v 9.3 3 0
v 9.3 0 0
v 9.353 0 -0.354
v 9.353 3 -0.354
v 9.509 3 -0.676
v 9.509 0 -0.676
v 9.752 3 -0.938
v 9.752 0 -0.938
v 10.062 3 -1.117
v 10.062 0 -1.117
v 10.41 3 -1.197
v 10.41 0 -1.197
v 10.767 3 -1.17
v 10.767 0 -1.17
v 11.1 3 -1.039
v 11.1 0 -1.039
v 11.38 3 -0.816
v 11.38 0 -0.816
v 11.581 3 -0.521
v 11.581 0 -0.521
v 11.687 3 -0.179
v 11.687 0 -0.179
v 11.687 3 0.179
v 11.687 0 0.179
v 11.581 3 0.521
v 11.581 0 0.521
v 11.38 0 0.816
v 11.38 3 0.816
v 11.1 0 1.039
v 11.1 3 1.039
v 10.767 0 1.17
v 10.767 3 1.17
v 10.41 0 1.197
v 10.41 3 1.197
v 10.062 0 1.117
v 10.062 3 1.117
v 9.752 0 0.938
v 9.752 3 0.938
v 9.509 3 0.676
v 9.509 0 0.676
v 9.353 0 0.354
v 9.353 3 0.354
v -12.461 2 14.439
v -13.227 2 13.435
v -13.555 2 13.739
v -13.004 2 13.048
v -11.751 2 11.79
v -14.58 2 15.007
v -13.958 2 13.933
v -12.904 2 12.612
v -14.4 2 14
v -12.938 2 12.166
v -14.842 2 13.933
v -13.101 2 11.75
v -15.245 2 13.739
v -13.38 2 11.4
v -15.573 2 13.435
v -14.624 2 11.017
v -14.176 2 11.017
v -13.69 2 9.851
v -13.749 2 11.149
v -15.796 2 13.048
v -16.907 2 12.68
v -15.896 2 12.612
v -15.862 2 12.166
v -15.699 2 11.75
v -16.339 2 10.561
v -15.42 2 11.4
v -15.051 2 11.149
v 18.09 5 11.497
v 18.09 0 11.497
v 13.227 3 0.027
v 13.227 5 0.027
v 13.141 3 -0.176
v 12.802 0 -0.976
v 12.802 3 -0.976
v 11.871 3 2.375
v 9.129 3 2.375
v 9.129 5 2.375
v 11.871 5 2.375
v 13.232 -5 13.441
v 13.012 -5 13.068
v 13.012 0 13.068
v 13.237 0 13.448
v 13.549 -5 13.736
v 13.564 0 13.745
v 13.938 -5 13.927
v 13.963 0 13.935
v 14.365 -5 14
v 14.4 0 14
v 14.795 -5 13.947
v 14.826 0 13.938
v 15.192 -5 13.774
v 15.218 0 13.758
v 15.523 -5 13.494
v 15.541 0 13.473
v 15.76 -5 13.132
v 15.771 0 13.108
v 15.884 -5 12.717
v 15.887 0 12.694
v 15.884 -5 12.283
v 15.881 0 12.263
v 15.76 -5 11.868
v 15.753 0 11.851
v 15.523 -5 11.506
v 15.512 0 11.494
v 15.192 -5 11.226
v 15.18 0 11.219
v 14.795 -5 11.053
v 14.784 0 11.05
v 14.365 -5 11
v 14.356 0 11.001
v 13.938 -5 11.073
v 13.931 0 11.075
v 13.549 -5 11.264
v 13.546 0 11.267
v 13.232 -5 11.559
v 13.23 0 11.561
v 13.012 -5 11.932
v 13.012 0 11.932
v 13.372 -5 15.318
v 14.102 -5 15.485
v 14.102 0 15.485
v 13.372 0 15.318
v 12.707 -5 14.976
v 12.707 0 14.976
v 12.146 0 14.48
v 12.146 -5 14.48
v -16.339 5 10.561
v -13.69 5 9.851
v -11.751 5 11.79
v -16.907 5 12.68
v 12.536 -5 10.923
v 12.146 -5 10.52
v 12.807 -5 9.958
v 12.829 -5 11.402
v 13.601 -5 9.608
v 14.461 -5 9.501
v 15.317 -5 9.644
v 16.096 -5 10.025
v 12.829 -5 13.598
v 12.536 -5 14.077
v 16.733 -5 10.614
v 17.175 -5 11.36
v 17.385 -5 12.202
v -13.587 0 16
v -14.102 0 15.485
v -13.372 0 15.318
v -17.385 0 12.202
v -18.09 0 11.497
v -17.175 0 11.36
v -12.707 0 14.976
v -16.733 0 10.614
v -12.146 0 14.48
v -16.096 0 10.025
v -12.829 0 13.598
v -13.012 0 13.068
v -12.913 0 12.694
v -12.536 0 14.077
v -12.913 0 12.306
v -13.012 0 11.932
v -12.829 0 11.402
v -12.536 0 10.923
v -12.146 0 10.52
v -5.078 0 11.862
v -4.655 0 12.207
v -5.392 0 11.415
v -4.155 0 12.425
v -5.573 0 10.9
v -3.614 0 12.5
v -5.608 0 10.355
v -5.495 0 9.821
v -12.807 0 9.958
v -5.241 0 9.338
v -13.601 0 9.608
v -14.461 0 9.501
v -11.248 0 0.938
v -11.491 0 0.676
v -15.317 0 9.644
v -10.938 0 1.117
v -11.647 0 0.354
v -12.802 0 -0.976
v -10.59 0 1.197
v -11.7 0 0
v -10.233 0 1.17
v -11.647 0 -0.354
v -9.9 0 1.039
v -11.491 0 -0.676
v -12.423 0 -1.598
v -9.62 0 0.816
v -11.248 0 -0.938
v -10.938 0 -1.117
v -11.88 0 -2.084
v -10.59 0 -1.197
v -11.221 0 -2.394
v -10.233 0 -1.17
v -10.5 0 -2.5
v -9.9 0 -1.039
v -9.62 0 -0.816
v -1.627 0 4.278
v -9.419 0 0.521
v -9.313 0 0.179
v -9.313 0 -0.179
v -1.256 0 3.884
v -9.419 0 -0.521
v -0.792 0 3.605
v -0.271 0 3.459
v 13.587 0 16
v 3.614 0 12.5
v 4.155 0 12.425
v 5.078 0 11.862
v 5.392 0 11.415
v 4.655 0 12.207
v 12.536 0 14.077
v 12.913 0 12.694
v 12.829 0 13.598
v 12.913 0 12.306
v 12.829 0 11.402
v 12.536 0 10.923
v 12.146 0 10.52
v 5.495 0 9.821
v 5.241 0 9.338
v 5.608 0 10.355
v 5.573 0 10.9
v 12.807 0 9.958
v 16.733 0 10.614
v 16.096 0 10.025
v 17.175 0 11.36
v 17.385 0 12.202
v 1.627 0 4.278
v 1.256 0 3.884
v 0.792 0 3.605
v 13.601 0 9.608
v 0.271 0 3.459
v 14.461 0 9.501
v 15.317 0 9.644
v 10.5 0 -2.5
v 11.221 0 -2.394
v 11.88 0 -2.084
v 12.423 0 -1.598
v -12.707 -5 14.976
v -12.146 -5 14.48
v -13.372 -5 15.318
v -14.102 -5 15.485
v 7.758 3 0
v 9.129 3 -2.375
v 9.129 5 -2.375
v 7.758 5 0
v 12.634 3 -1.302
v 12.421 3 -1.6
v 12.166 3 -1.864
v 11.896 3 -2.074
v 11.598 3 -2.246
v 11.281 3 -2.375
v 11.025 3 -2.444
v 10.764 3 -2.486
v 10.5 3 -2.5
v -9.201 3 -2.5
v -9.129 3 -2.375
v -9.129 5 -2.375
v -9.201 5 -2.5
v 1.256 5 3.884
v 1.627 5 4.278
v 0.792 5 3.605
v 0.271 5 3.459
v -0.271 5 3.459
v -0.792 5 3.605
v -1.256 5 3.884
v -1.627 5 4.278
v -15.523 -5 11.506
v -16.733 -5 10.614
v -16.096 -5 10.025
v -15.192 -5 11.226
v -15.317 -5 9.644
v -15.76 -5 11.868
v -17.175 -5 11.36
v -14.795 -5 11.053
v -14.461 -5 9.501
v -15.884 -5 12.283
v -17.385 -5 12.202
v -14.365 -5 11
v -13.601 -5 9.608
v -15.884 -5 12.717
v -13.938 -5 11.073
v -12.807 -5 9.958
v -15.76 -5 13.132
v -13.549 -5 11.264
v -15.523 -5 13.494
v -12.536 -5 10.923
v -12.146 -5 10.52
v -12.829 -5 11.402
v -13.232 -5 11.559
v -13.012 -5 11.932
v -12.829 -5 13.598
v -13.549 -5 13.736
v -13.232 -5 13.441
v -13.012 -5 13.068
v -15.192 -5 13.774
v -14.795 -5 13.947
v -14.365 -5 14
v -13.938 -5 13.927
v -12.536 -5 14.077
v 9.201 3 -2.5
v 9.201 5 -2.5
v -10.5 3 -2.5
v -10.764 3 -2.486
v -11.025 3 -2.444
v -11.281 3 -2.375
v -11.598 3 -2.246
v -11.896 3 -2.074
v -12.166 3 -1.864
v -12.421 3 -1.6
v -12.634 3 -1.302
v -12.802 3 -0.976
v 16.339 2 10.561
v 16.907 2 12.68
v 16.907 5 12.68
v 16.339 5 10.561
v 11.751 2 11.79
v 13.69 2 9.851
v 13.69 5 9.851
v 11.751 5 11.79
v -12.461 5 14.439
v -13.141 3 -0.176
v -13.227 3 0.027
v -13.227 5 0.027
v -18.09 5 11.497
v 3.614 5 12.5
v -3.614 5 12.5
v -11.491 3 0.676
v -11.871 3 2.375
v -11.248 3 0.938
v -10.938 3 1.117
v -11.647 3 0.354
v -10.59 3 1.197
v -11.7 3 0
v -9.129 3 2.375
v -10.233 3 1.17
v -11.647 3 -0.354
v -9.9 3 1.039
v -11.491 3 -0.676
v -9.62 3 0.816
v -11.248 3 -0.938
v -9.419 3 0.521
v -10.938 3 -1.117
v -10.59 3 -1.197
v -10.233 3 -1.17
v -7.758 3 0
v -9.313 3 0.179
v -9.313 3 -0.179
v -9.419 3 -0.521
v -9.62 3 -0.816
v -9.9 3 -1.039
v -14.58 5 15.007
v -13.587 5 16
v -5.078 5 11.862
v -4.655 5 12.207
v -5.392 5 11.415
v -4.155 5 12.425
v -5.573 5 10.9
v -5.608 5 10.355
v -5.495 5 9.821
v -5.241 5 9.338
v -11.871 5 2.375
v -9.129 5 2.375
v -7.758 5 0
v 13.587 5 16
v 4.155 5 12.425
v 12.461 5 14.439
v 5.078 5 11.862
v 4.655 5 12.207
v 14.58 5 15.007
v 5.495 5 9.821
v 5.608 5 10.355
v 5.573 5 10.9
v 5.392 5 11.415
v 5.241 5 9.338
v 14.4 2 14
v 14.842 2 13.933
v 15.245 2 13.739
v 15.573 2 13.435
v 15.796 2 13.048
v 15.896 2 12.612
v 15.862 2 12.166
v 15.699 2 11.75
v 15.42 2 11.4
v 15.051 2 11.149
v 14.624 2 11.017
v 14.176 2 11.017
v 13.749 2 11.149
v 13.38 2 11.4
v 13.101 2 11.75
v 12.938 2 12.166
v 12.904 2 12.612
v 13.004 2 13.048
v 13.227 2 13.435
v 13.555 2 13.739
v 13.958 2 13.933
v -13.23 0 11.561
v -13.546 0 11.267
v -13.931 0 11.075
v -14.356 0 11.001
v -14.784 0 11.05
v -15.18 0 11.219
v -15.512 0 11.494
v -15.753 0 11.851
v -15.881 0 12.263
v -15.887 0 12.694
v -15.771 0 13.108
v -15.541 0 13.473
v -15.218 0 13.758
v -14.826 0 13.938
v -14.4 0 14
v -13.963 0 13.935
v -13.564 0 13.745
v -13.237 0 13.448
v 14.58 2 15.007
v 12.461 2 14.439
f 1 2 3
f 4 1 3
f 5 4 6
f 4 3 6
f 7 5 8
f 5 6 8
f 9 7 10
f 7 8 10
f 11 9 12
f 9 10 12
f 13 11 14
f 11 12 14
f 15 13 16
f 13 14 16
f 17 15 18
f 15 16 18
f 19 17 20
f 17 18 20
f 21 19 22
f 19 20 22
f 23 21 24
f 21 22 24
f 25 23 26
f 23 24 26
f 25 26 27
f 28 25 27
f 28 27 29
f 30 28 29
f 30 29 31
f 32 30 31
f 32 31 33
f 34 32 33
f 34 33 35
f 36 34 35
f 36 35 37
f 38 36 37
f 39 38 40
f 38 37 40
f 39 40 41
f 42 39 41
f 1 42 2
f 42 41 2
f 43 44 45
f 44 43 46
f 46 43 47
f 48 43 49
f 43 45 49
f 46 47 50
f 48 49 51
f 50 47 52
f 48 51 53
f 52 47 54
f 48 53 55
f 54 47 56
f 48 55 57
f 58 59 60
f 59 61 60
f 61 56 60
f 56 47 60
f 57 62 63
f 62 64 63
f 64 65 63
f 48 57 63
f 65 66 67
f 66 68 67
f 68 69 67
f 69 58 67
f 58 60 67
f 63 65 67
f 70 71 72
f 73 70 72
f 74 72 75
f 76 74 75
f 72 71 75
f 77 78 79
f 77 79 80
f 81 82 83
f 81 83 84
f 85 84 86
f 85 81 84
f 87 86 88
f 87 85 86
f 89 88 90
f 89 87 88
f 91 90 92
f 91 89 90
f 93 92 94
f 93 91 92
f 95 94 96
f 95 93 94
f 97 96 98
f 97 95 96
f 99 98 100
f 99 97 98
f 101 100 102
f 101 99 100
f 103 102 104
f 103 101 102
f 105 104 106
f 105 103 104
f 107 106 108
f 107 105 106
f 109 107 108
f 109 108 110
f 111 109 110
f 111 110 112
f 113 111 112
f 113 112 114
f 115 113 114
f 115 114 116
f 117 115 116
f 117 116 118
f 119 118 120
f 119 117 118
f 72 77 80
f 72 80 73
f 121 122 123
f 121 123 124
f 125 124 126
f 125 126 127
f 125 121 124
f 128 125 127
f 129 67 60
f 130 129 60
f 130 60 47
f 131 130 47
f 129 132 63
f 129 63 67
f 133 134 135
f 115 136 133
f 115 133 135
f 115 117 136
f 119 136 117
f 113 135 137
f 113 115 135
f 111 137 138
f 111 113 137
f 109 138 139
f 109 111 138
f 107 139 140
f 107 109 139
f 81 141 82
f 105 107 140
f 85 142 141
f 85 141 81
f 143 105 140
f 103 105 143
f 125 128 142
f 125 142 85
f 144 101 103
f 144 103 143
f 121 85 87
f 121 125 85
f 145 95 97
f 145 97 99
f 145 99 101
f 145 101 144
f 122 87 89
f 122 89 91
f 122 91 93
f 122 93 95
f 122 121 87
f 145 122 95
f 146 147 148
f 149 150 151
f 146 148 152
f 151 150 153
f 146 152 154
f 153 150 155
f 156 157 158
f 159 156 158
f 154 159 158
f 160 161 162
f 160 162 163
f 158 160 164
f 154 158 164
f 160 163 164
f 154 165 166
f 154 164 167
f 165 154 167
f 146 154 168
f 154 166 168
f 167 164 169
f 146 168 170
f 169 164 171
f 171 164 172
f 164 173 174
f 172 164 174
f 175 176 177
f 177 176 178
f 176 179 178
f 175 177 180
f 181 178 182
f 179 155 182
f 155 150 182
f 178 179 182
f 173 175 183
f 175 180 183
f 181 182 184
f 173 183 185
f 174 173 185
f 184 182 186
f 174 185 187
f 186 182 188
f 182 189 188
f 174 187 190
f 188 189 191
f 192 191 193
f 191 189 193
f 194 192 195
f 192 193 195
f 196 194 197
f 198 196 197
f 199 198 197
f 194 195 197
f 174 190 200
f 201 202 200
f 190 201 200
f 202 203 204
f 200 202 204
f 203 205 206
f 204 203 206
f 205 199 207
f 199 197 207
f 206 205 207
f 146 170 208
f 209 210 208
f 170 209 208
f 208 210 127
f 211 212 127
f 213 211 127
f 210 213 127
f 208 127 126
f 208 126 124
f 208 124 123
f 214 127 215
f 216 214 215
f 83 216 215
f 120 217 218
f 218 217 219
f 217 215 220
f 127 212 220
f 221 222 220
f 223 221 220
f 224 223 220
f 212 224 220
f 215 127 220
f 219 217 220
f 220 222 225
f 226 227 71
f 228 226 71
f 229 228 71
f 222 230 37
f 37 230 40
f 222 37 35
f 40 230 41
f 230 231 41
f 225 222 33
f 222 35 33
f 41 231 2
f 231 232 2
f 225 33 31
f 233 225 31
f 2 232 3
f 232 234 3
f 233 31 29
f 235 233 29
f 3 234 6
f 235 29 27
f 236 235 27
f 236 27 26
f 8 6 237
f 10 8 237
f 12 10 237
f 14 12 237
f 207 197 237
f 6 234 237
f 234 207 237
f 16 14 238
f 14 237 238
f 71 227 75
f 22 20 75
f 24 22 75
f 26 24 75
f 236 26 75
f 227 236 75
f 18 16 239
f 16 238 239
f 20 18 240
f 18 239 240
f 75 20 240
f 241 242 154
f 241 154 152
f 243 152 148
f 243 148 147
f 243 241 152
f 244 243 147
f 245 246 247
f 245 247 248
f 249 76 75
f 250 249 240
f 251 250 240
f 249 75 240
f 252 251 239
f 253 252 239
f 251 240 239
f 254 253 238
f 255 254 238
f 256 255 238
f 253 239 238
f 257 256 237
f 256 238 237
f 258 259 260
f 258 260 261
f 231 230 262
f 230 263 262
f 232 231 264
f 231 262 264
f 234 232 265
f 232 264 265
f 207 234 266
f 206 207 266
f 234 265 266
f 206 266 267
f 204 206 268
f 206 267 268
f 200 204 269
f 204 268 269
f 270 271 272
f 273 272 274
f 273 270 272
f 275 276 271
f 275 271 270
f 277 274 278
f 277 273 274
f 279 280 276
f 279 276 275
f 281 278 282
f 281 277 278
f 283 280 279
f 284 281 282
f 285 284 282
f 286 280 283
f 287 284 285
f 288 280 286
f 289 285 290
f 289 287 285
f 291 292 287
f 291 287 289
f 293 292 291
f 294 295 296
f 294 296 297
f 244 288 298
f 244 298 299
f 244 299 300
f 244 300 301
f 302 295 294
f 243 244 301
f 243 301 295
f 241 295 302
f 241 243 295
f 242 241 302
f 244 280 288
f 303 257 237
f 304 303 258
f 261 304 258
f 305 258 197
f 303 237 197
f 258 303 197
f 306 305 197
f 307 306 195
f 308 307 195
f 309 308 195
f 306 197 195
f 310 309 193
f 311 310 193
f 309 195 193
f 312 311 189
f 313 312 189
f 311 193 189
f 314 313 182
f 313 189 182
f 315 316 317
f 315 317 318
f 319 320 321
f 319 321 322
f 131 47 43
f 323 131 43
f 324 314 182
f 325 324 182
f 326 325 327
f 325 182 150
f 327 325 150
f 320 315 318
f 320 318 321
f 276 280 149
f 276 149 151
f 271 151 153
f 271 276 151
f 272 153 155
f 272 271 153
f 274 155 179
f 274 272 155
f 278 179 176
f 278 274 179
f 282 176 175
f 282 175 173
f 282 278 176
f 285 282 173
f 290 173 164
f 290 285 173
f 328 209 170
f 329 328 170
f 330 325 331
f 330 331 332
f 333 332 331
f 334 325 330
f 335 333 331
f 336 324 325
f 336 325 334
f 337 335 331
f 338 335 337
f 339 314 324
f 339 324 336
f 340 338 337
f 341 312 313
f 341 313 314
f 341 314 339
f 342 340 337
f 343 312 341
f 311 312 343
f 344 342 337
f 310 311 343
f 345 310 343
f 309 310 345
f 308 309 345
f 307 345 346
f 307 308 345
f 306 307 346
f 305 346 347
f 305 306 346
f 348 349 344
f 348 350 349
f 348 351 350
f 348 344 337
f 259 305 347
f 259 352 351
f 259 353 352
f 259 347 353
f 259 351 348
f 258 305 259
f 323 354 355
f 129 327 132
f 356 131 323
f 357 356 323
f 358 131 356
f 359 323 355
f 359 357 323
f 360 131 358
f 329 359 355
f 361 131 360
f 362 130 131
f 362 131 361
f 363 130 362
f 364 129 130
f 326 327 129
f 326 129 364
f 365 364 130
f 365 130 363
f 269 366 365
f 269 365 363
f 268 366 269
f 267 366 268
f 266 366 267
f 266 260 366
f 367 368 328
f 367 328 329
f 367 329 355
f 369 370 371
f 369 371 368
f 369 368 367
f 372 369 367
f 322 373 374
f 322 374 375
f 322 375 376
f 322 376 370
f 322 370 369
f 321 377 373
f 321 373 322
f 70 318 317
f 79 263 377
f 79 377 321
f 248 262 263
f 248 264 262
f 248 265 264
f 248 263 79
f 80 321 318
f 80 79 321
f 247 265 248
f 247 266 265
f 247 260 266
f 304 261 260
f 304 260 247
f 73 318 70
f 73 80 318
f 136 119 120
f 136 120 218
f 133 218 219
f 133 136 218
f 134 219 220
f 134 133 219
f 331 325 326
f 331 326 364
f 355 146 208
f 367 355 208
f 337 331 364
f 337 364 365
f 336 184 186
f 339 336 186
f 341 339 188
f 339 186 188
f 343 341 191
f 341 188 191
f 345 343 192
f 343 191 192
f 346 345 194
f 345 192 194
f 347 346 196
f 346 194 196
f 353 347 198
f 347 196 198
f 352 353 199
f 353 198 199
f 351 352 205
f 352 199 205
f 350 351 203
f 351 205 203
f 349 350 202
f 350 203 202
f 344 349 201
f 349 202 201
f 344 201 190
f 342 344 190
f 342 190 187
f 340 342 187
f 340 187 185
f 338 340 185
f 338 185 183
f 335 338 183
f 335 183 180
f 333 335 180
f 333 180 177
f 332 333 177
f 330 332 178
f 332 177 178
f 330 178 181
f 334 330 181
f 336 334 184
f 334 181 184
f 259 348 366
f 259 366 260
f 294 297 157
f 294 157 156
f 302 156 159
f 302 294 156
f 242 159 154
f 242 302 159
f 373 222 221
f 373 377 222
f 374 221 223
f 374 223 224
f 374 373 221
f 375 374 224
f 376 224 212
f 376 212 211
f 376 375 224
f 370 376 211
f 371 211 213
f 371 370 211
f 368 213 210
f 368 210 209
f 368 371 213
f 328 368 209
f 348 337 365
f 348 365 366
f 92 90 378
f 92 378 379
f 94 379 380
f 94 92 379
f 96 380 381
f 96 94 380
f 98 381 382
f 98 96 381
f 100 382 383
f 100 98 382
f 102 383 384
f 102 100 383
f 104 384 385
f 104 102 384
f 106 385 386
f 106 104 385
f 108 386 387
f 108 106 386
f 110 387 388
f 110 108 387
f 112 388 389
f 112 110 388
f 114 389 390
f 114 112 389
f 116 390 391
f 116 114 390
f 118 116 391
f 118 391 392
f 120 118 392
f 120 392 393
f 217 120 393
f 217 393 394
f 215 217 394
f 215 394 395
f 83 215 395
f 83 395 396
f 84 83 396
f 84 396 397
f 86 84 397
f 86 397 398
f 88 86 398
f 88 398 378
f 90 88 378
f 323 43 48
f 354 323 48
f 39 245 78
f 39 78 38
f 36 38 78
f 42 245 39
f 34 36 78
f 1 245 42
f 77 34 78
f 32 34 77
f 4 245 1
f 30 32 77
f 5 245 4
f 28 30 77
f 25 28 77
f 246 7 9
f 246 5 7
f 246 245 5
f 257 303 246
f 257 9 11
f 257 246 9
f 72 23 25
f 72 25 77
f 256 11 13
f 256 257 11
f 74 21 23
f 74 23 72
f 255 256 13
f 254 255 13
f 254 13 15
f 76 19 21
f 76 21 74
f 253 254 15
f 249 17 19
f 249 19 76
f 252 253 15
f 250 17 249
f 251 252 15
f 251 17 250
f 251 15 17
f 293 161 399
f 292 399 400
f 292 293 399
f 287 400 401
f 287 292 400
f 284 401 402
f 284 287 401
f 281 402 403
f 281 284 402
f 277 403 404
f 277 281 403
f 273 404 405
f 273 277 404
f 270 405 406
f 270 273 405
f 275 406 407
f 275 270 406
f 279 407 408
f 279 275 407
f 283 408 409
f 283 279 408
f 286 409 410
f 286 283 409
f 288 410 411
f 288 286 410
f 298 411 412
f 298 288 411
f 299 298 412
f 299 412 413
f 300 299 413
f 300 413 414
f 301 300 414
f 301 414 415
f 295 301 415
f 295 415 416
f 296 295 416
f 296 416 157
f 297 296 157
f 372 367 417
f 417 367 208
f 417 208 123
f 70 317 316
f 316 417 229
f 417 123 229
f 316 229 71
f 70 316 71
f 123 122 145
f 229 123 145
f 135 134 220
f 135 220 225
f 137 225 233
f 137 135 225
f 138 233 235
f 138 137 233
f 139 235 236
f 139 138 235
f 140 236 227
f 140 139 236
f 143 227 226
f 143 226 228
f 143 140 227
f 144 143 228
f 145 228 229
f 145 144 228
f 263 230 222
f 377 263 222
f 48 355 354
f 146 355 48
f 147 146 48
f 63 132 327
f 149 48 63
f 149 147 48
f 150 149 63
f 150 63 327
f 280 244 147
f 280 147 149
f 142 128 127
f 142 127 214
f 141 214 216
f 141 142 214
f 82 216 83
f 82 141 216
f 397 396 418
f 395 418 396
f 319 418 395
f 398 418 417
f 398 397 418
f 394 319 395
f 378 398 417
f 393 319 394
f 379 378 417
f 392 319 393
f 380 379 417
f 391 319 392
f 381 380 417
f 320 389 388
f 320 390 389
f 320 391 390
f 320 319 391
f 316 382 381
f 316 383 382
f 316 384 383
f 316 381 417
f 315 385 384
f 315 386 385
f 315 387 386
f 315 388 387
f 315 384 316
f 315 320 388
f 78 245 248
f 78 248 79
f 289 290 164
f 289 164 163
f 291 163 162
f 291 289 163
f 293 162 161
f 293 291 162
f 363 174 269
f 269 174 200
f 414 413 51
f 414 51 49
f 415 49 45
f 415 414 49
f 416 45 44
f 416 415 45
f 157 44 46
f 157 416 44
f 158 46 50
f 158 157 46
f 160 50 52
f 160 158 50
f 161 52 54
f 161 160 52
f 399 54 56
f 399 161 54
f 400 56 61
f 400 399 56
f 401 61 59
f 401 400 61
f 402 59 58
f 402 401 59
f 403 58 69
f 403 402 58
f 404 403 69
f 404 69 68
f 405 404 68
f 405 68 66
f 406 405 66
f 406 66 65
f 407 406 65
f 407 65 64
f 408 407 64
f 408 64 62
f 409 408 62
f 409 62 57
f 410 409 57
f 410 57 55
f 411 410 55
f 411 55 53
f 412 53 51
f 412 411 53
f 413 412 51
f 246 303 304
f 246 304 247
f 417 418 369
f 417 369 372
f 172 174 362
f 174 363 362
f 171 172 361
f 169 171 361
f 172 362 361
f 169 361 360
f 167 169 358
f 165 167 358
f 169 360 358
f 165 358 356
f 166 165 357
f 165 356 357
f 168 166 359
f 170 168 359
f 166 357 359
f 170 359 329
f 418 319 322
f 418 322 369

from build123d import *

# Parameters (mm, degrees)
SKETCH1_R            = 1.5
SKETCH1_R_2          = 2.5
BOSS_EXTRUDE1_DEPTH  = 5
M2_CLEARANCE_HOLE1_D = 2.4
FILLET1_R            = 2
BOSS_EXTRUDE2_START  = 5
BOSS_EXTRUDE2_DEPTH  = 5
CUT_EXTRUDE1_START   = -3
SKETCH5_R            = 1.5
CUT_EXTRUDE1_DEPTH   = 3
CUT_EXTRUDE2_START   = -2
SKETCH6_R            = 1.2
CUT_EXTRUDE2_DEPTH   = 2


with BuildPart() as part:
    # Sketch1 → Boss-Extrude1 (new body)
    # profile 1 of 3: a face of its own
    with BuildSketch(Plane(origin=(0, 0, 0), x_dir=(1, 0, 0), z_dir=(0, 1, 0))):
        with BuildLine():
            Line((10.5, 2.5), (-10.5, 2.5))
            ThreePointArc((-10.5, 2.5), (-8.732233047, 1.767766953), (-8, 0))
            ThreePointArc((-8, 0), (-10.997961344, -2.449904998), (-12.8016276, 0.975966388))
            Line((-12.8016276, 0.975966388), (-18.090408136, -11.496597633))
            Line((-18.090408136, -11.496597633), (-13.587005769, -16))
            Line((-13.587005769, -16), (13.587005769, -16))
            Line((13.587005769, -16), (18.090408136, -11.496597633))
            Line((18.090408136, -11.496597633), (12.8016276, 0.975966388))
            ThreePointArc((12.8016276, 0.975966388), (12.949904998, 0.497961344), (13, 0))
            ThreePointArc((13, 0), (8.732233047, -1.767766953), (10.5, 2.5))
        make_face()
        with Locations(Location((-14.4, -12.5, 0), (0, 0, 270))):
            Circle(SKETCH1_R, mode=Mode.SUBTRACT)
        with Locations(Location((14.4, -12.5, 0), (0, 0, 270))):
            Circle(SKETCH1_R, mode=Mode.SUBTRACT)
        Polygon((-7.5, -12.5), (0, -2), (7.5, -12.5), align=None, mode=Mode.SUBTRACT)
    # profile 2 of 3: a face of its own
    with BuildSketch(Plane(origin=(0, 0, 0), x_dir=(1, 0, 0), z_dir=(0, 1, 0))):
        with Locations((-10.5, 0)):
            Circle(SKETCH1_R_2)
    # profile 3 of 3: a face of its own
    with BuildSketch(Plane(origin=(0, 0, 0), x_dir=(1, 0, 0), z_dir=(0, 1, 0))):
        with Locations((10.5, 0)):
            Circle(SKETCH1_R_2)
    extrude(amount=BOSS_EXTRUDE1_DEPTH)

    # M2 Clearance Hole1 (through all)
    with Locations(Plane(origin=(0, 5, 0), x_dir=(1, 0, 0), z_dir=(0, 1, 0))):
        with Locations((-10.5, 0), (10.5, 0)):
            Hole(M2_CLEARANCE_HOLE1_D / 2)

    # Fillet1
    fillet1_edges = [part.edges().sort_by_distance(p)[0] for p in [
        (0, 2.5, 2),
        (-7.5, 2.5, 12.5),
        (7.5, 2.5, 12.5),
    ]]
    fillet(fillet1_edges, radius=FILLET1_R)

    # Sketch4 → Boss-Extrude2 (add)
    with BuildSketch(Plane.XZ.offset(BOSS_EXTRUDE2_START)):
        with BuildLine():
            Line((-14.101857368, 15.4851484), (-17.3851484, 12.201857368))
            ThreePointArc((-17.3851484, 12.201857368), (-15.317017203, 9.643589762), (-12.146233974, 10.519964975))
            ThreePointArc((-12.146233974, 10.519964975), (-12.695571974, 11.154604627), (-13.01161859, 11.932199807))
            ThreePointArc((-13.01161859, 11.932199807), (-15.9, 12.5), (-13.01161859, 13.067800193))
            ThreePointArc((-13.01161859, 13.067800193), (-12.695571974, 13.845395373), (-12.146233974, 14.480035025))
            ThreePointArc((-12.146233974, 14.480035025), (-13.028642033, 15.168216132), (-14.101857368, 15.4851484))
        make_face()
        with BuildLine():
            ThreePointArc((12.146233974, 10.519964975), (15.317017203, 9.643589762), (17.3851484, 12.201857368))
            Line((17.3851484, 12.201857368), (14.101857368, 15.4851484))
            ThreePointArc((14.101857368, 15.4851484), (13.028642033, 15.168216132), (12.146233974, 14.480035025))
            ThreePointArc((12.146233974, 14.480035025), (12.695571974, 13.845395373), (13.01161859, 13.067800193))
            ThreePointArc((13.01161859, 13.067800193), (15.9, 12.5), (13.01161859, 11.932199807))
            ThreePointArc((13.01161859, 11.932199807), (12.695571974, 11.154604627), (12.146233974, 10.519964975))
        make_face()
    extrude(amount=-BOSS_EXTRUDE2_DEPTH)

    # Sketch5 → Cut-Extrude1 (cut)
    # profile 1 of 2: a face of its own
    with BuildSketch(Plane(origin=(0, 5, 0), x_dir=(1, 0, 0), z_dir=(0, 1, 0)).offset(CUT_EXTRUDE1_START)):
        Polygon((15.109788915, -15.148968295), (17.048968295, -13.209788915), (16.33917938, -10.56082062), (13.690211085, -9.851031705), (11.751031705, -11.790211085), (12.46082062, -14.43917938), align=None)
        with Locations(Location((14.4, -12.5, 0), (0, 0, 157.757128517))):
            Circle(SKETCH5_R, mode=Mode.SUBTRACT)
    # profile 2 of 2: a face of its own
    with BuildSketch(Plane(origin=(0, 5, 0), x_dir=(1, 0, 0), z_dir=(0, 1, 0)).offset(CUT_EXTRUDE1_START)):
        Polygon((-12.46082062, -14.43917938), (-15.109788915, -15.148968295), (-17.048968295, -13.209788915), (-16.33917938, -10.56082062), (-13.690211085, -9.851031705), (-11.751031705, -11.790211085), align=None)
    extrude(amount=CUT_EXTRUDE1_DEPTH, mode=Mode.SUBTRACT)

    # Sketch6 → Cut-Extrude2 (cut)
    # profile 1 of 6: a face of its own
    with BuildSketch(Plane(origin=(0, 5, 0), x_dir=(1, 0, 0), z_dir=(0, 1, 0)).offset(CUT_EXTRUDE2_START)):
        with BuildLine():
            Line((-7.757586221, 0), (-9.128793111, 2.375))
            Line((-9.128793111, 2.375), (-11.28062475, 2.375))
            ThreePointArc((-11.28062475, 2.375), (-11.75, 2.165063509), (-12.166497959, 1.863540864))
            Line((-12.166497959, 1.863540864), (-13.140949749, 0.175740855))
            Line((-13.140949749, 0.175740855), (-13.226879096, -0.026906859))
            Line((-13.226879096, -0.026906859), (-11.871206889, -2.375))
            Line((-11.871206889, -2.375), (-9.128793111, -2.375))
            Line((-9.128793111, -2.375), (-7.757586221, 0))
        make_face()
        with Locations(Location((-10.5, 0, 0), (0, 0, 270))):
            Circle(SKETCH6_R, mode=Mode.SUBTRACT)
    # profile 2 of 6: a face of its own
    with BuildSketch(Plane(origin=(0, 5, 0), x_dir=(1, 0, 0), z_dir=(0, 1, 0)).offset(CUT_EXTRUDE2_START)):
        with BuildLine():
            Line((-13.140949749, 0.175740855), (-12.166497959, 1.863540864))
            ThreePointArc((-12.166497959, 1.863540864), (-12.533089331, 1.454835995), (-12.8016276, 0.975966388))
            Line((-12.8016276, 0.975966388), (-13.140949749, 0.175740855))
        make_face()
    # profile 3 of 6: a face of its own
    with BuildSketch(Plane(origin=(0, 5, 0), x_dir=(1, 0, 0), z_dir=(0, 1, 0)).offset(CUT_EXTRUDE2_START)):
        with BuildLine():
            Line((-9.128793111, 2.375), (-9.200961894, 2.5))
            Line((-9.200961894, 2.5), (-10.5, 2.5))
            ThreePointArc((-10.5, 2.5), (-10.895284708, 2.468552207), (-11.28062475, 2.375))
            Line((-11.28062475, 2.375), (-9.128793111, 2.375))
        make_face()
    # profile 4 of 6: a face of its own
    with BuildSketch(Plane(origin=(0, 5, 0), x_dir=(1, 0, 0), z_dir=(0, 1, 0)).offset(CUT_EXTRUDE2_START)):
        with BuildLine():
            Line((7.757586221, 0), (9.128793111, -2.375))
            Line((9.128793111, -2.375), (11.871206889, -2.375))
            Line((11.871206889, -2.375), (13.226879096, -0.026906859))
            Line((13.226879096, -0.026906859), (13.140949749, 0.175740855))
            Line((13.140949749, 0.175740855), (12.166497959, 1.863540864))
            ThreePointArc((12.166497959, 1.863540864), (11.75, 2.165063509), (11.28062475, 2.375))
            Line((11.28062475, 2.375), (9.128793111, 2.375))
            Line((9.128793111, 2.375), (7.757586221, 0))
        make_face()
        with Locations(Location((10.5, 0, 0), (0, 0, 270))):
            Circle(SKETCH6_R, mode=Mode.SUBTRACT)
    # profile 5 of 6: a face of its own
    with BuildSketch(Plane(origin=(0, 5, 0), x_dir=(1, 0, 0), z_dir=(0, 1, 0)).offset(CUT_EXTRUDE2_START)):
        with BuildLine():
            Line((12.166497959, 1.863540864), (13.140949749, 0.175740855))
            Line((13.140949749, 0.175740855), (12.8016276, 0.975966388))
            ThreePointArc((12.8016276, 0.975966388), (12.533089331, 1.454835995), (12.166497959, 1.863540864))
        make_face()
    # profile 6 of 6: a face of its own
    with BuildSketch(Plane(origin=(0, 5, 0), x_dir=(1, 0, 0), z_dir=(0, 1, 0)).offset(CUT_EXTRUDE2_START)):
        with BuildLine():
            Line((9.200961894, 2.5), (9.128793111, 2.375))
            Line((9.128793111, 2.375), (11.28062475, 2.375))
            ThreePointArc((11.28062475, 2.375), (10.895284708, 2.468552207), (10.5, 2.5))
            Line((10.5, 2.5), (9.200961894, 2.5))
        make_face()
    extrude(amount=CUT_EXTRUDE2_DEPTH, mode=Mode.SUBTRACT)


solid = part.part
